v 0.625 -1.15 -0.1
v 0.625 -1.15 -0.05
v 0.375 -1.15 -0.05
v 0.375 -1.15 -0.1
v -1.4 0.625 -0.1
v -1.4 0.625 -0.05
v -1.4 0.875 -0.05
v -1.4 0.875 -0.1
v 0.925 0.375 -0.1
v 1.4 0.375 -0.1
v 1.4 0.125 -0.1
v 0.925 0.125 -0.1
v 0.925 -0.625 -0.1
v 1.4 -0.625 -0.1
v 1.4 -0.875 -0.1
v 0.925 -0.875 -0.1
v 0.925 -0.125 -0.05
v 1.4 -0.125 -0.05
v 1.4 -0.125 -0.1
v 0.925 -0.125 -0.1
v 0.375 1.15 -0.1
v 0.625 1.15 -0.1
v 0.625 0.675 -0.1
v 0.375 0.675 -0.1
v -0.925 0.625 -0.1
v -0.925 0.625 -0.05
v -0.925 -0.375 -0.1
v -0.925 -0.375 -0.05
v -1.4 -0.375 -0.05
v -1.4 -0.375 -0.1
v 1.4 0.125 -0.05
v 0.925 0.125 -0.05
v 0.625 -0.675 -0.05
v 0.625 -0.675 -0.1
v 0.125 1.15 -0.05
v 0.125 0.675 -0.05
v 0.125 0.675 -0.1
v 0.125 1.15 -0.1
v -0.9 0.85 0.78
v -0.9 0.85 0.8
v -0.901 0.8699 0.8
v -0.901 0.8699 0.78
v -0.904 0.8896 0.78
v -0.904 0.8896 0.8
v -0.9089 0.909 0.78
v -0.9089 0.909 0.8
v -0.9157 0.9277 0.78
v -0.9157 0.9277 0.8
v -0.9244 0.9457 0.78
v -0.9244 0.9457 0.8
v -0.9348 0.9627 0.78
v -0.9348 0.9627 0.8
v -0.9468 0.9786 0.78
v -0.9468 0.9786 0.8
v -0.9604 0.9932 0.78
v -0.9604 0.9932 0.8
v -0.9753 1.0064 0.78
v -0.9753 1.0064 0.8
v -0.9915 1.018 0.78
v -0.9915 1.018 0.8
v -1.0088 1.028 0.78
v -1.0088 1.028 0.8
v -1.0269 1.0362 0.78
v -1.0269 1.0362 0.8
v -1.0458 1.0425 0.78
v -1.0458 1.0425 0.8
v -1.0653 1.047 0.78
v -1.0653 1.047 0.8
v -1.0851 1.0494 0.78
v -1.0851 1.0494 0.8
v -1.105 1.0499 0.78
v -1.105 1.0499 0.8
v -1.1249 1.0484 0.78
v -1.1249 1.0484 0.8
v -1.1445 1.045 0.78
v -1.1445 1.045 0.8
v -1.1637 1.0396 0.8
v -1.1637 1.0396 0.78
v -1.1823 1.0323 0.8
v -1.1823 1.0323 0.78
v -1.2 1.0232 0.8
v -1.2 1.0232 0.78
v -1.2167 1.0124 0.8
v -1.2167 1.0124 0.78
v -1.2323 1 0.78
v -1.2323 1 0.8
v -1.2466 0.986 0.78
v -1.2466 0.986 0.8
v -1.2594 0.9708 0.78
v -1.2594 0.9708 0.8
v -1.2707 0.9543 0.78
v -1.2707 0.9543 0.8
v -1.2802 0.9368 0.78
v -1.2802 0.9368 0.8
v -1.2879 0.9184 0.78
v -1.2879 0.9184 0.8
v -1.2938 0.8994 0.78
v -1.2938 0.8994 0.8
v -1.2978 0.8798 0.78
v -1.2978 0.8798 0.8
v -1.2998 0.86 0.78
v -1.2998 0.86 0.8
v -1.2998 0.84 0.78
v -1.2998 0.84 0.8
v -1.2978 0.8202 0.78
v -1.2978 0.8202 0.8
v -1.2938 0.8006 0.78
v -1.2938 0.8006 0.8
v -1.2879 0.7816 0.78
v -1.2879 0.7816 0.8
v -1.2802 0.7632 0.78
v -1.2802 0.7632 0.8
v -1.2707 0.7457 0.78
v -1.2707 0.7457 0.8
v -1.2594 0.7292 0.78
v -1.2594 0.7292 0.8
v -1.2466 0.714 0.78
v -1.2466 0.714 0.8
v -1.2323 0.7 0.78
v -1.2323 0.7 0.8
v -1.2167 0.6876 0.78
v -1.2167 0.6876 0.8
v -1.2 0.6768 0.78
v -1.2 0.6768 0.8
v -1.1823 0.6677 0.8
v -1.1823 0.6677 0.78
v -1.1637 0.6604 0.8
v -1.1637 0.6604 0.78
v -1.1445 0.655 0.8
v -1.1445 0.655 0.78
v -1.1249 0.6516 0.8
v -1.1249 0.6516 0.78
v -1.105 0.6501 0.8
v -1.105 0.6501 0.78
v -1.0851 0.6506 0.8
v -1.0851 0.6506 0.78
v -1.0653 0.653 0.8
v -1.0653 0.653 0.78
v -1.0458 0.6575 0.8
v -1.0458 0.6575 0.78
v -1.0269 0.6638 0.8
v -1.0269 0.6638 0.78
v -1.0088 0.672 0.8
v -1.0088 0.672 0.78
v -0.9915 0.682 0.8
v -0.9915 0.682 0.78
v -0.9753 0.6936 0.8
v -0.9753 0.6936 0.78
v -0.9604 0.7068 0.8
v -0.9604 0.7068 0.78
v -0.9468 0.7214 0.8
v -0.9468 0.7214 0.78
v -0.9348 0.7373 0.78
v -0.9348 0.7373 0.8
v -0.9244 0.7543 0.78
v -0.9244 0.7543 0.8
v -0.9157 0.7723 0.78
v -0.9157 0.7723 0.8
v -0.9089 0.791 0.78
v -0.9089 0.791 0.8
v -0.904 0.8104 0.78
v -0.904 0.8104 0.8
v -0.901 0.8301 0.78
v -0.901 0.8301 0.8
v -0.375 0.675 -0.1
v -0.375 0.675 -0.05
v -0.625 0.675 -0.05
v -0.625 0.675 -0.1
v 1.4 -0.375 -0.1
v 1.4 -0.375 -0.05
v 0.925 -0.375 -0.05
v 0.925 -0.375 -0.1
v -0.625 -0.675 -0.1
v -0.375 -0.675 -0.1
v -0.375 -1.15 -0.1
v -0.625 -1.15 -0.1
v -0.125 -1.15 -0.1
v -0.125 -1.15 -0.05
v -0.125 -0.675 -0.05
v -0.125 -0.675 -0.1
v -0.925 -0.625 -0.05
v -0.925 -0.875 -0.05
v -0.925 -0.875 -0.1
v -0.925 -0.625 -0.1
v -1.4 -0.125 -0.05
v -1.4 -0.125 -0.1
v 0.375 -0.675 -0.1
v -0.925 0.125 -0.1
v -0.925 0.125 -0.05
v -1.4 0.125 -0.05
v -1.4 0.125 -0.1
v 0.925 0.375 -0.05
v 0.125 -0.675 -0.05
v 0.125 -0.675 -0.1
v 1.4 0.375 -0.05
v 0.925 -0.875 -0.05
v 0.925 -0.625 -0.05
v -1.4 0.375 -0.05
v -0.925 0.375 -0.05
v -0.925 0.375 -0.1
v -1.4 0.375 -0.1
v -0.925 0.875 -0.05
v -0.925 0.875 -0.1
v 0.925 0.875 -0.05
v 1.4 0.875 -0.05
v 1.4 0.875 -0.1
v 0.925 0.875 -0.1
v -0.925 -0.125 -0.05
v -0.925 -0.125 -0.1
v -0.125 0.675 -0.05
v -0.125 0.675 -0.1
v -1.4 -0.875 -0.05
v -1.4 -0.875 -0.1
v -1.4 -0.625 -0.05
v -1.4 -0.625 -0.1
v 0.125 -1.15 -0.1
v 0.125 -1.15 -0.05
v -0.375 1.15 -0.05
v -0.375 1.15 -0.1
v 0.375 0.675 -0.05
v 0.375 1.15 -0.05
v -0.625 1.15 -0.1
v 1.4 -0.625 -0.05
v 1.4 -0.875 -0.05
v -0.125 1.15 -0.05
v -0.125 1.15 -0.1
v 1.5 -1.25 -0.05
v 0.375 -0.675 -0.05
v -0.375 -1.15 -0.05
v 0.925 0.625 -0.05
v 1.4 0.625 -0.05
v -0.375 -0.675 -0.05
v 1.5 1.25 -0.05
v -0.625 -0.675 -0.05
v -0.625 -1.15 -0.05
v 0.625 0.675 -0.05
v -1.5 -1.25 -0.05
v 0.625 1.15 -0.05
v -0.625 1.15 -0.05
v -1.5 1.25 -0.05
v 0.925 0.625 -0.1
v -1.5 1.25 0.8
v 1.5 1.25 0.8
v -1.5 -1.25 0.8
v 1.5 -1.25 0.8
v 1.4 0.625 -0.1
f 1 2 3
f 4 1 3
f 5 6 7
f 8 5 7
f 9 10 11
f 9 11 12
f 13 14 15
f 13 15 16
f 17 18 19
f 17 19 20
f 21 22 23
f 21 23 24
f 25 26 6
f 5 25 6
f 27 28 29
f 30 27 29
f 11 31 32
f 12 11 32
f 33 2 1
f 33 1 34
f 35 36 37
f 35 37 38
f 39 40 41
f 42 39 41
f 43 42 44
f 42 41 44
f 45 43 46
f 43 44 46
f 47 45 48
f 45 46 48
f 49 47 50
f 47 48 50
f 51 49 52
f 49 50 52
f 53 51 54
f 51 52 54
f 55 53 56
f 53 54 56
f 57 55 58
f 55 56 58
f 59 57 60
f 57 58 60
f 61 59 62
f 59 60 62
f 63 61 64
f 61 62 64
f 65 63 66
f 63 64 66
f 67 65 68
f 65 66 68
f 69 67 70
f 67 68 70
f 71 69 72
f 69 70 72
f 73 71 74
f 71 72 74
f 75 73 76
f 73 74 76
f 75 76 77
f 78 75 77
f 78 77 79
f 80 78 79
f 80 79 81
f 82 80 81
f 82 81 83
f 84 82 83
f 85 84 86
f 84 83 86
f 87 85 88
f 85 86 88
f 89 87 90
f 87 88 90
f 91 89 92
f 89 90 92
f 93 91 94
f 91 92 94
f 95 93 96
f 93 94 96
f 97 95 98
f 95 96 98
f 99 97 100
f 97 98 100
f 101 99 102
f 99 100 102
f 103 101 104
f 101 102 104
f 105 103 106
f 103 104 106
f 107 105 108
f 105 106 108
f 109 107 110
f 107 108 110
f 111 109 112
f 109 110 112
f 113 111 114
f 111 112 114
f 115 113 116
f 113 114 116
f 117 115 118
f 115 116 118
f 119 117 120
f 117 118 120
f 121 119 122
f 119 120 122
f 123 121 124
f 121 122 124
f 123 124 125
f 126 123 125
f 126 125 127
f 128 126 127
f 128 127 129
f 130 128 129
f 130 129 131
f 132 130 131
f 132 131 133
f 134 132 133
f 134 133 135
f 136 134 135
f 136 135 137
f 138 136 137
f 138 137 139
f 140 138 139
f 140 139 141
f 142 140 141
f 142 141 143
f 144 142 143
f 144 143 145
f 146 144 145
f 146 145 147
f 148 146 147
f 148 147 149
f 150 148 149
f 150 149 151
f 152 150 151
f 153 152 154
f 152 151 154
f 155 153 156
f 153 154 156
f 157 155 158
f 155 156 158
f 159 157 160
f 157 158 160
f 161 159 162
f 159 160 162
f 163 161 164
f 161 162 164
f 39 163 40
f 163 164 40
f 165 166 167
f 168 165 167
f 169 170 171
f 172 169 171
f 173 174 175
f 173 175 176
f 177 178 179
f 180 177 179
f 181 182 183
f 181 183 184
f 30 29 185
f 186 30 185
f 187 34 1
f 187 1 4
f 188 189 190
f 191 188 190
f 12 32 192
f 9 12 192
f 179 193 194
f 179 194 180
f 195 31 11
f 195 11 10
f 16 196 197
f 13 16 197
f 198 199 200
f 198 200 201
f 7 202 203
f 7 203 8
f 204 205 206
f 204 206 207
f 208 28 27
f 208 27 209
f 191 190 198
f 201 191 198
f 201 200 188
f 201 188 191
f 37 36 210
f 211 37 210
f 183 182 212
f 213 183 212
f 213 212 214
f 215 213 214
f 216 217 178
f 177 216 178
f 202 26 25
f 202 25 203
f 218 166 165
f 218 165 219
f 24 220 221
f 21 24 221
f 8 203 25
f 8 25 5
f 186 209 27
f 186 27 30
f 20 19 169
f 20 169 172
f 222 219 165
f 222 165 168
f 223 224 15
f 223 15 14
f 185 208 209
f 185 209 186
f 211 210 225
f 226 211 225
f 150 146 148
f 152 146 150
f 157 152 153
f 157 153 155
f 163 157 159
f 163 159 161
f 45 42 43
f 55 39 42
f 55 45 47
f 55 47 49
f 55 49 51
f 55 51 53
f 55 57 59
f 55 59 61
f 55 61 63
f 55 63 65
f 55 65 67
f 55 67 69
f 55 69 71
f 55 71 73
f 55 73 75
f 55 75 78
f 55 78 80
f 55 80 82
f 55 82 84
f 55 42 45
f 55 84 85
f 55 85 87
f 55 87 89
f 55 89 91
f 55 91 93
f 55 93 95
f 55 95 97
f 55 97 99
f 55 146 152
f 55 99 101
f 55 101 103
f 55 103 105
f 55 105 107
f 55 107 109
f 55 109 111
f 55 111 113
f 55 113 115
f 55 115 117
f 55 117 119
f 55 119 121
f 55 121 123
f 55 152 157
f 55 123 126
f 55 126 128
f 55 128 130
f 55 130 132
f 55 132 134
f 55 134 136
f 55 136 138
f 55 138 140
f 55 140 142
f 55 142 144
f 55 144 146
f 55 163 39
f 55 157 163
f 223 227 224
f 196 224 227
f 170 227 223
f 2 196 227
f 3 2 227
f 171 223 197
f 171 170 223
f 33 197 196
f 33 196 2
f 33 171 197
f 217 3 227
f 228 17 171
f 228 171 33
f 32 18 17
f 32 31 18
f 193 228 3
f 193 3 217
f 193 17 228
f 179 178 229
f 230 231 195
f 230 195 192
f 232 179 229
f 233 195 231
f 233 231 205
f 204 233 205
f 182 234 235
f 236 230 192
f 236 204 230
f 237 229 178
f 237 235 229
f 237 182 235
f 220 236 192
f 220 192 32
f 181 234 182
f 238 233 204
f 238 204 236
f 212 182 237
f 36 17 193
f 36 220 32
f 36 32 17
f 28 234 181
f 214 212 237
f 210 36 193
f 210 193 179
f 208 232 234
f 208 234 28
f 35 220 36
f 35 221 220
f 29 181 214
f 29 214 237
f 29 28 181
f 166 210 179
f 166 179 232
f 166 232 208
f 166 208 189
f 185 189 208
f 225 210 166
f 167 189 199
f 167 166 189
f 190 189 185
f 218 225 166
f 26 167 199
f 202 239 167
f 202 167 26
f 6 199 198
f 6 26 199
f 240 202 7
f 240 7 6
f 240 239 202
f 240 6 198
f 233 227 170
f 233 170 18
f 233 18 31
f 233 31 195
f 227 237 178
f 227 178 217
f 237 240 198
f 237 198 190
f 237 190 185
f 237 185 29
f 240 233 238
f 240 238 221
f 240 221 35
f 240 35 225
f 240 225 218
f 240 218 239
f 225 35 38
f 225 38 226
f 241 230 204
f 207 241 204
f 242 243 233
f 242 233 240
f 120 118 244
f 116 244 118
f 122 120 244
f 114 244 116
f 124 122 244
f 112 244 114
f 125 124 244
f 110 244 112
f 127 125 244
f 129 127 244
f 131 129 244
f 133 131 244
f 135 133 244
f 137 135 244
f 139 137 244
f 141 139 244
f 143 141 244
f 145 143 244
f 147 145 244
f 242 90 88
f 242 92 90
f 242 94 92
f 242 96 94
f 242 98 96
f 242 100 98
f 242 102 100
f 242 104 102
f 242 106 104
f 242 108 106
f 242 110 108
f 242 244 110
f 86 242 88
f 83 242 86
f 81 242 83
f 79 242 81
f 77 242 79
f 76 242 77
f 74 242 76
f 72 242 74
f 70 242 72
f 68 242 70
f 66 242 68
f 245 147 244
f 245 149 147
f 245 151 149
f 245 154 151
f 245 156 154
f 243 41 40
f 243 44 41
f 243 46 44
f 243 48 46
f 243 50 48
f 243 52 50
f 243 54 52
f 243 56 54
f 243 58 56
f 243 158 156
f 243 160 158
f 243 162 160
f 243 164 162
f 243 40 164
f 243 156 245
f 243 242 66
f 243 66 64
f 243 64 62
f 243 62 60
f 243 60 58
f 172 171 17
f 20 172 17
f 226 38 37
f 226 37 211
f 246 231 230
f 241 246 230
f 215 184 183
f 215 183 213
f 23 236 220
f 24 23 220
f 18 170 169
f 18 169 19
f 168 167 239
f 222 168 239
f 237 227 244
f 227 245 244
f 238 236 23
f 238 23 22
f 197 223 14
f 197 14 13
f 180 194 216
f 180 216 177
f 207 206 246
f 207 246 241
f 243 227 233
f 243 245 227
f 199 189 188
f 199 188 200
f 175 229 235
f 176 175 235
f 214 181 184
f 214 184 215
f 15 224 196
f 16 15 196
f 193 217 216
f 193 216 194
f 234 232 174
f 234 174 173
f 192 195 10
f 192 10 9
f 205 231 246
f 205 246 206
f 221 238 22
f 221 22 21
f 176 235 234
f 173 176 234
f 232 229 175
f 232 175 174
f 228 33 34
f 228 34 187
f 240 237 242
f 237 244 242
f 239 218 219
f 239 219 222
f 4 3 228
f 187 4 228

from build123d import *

# Parameters (mm, degrees)
SKETCH1_W           = 3
SKETCH1_H           = 2.5
BOSS_EXTRUDE1_DEPTH = 0.8
SKETCH2_R           = 0.2
CUT_EXTRUDE1_DEPTH  = 0.02
SKETCH3_W           = 0.25
SKETCH3_H           = 0.475
SKETCH3_W_2         = 0.475
SKETCH3_H_2         = 0.25
BOSS_EXTRUDE2_DEPTH = 0.1
SKETCH4_W           = 3
SKETCH4_H           = 2.5
BOSS_EXTRUDE3_DEPTH = 0.05


with BuildPart() as part:
    # Sketch1 → Boss-Extrude1 (new body)
    with BuildSketch(Plane.XY):
        Rectangle(SKETCH1_W, SKETCH1_H)
    extrude(amount=BOSS_EXTRUDE1_DEPTH)

    # Sketch2 → Cut-Extrude1 (cut)
    with BuildSketch(Plane.XY.offset(0.8)):
        with Locations((-1.1, 0.85)):
            Circle(SKETCH2_R)
    extrude(amount=-CUT_EXTRUDE1_DEPTH, mode=Mode.SUBTRACT)

    # Sketch3 → Boss-Extrude2 (add)
    with BuildSketch(Plane(origin=(0, 0, 0), x_dir=(-1, 0, 0), z_dir=(0, 0, -1))):
        with Locations((0.5, 0.9125)):
            Rectangle(SKETCH3_W, SKETCH3_H)
        with Locations((0, 0.9125)):
            Rectangle(SKETCH3_W, SKETCH3_H)
        with Locations((-0.5, 0.9125)):
            Rectangle(SKETCH3_W, SKETCH3_H)
        with Locations((0.5, -0.9125)):
            Rectangle(SKETCH3_W, SKETCH3_H)
        with Locations((0, -0.9125)):
            Rectangle(SKETCH3_W, SKETCH3_H)
        with Locations((-0.5, -0.9125)):
            Rectangle(SKETCH3_W, SKETCH3_H)
        with Locations((-1.1625, -0.25)):
            Rectangle(SKETCH3_W_2, SKETCH3_H_2)
        with Locations((-1.1625, 0.25)):
            Rectangle(SKETCH3_W_2, SKETCH3_H_2)
        with Locations((-1.1625, -0.75)):
            Rectangle(SKETCH3_W_2, SKETCH3_H_2)
        with Locations((-1.1625, 0.75)):
            Rectangle(SKETCH3_W_2, SKETCH3_H_2)
        with Locations((1.1625, -0.75)):
            Rectangle(SKETCH3_W_2, SKETCH3_H_2)
        with Locations((1.1625, -0.25)):
            Rectangle(SKETCH3_W_2, SKETCH3_H_2)
        with Locations((1.1625, 0.25)):
            Rectangle(SKETCH3_W_2, SKETCH3_H_2)
        with Locations((1.1625, 0.75)):
            Rectangle(SKETCH3_W_2, SKETCH3_H_2)
    extrude(amount=BOSS_EXTRUDE2_DEPTH)

    # Sketch4 → Boss-Extrude3 (add)
    with BuildSketch(Plane(origin=(0, 0, 0), x_dir=(-1, 0, 0), z_dir=(0, 0, -1))):
        Rectangle(SKETCH4_W, SKETCH4_H)
    extrude(amount=BOSS_EXTRUDE3_DEPTH)


solid = part.part
